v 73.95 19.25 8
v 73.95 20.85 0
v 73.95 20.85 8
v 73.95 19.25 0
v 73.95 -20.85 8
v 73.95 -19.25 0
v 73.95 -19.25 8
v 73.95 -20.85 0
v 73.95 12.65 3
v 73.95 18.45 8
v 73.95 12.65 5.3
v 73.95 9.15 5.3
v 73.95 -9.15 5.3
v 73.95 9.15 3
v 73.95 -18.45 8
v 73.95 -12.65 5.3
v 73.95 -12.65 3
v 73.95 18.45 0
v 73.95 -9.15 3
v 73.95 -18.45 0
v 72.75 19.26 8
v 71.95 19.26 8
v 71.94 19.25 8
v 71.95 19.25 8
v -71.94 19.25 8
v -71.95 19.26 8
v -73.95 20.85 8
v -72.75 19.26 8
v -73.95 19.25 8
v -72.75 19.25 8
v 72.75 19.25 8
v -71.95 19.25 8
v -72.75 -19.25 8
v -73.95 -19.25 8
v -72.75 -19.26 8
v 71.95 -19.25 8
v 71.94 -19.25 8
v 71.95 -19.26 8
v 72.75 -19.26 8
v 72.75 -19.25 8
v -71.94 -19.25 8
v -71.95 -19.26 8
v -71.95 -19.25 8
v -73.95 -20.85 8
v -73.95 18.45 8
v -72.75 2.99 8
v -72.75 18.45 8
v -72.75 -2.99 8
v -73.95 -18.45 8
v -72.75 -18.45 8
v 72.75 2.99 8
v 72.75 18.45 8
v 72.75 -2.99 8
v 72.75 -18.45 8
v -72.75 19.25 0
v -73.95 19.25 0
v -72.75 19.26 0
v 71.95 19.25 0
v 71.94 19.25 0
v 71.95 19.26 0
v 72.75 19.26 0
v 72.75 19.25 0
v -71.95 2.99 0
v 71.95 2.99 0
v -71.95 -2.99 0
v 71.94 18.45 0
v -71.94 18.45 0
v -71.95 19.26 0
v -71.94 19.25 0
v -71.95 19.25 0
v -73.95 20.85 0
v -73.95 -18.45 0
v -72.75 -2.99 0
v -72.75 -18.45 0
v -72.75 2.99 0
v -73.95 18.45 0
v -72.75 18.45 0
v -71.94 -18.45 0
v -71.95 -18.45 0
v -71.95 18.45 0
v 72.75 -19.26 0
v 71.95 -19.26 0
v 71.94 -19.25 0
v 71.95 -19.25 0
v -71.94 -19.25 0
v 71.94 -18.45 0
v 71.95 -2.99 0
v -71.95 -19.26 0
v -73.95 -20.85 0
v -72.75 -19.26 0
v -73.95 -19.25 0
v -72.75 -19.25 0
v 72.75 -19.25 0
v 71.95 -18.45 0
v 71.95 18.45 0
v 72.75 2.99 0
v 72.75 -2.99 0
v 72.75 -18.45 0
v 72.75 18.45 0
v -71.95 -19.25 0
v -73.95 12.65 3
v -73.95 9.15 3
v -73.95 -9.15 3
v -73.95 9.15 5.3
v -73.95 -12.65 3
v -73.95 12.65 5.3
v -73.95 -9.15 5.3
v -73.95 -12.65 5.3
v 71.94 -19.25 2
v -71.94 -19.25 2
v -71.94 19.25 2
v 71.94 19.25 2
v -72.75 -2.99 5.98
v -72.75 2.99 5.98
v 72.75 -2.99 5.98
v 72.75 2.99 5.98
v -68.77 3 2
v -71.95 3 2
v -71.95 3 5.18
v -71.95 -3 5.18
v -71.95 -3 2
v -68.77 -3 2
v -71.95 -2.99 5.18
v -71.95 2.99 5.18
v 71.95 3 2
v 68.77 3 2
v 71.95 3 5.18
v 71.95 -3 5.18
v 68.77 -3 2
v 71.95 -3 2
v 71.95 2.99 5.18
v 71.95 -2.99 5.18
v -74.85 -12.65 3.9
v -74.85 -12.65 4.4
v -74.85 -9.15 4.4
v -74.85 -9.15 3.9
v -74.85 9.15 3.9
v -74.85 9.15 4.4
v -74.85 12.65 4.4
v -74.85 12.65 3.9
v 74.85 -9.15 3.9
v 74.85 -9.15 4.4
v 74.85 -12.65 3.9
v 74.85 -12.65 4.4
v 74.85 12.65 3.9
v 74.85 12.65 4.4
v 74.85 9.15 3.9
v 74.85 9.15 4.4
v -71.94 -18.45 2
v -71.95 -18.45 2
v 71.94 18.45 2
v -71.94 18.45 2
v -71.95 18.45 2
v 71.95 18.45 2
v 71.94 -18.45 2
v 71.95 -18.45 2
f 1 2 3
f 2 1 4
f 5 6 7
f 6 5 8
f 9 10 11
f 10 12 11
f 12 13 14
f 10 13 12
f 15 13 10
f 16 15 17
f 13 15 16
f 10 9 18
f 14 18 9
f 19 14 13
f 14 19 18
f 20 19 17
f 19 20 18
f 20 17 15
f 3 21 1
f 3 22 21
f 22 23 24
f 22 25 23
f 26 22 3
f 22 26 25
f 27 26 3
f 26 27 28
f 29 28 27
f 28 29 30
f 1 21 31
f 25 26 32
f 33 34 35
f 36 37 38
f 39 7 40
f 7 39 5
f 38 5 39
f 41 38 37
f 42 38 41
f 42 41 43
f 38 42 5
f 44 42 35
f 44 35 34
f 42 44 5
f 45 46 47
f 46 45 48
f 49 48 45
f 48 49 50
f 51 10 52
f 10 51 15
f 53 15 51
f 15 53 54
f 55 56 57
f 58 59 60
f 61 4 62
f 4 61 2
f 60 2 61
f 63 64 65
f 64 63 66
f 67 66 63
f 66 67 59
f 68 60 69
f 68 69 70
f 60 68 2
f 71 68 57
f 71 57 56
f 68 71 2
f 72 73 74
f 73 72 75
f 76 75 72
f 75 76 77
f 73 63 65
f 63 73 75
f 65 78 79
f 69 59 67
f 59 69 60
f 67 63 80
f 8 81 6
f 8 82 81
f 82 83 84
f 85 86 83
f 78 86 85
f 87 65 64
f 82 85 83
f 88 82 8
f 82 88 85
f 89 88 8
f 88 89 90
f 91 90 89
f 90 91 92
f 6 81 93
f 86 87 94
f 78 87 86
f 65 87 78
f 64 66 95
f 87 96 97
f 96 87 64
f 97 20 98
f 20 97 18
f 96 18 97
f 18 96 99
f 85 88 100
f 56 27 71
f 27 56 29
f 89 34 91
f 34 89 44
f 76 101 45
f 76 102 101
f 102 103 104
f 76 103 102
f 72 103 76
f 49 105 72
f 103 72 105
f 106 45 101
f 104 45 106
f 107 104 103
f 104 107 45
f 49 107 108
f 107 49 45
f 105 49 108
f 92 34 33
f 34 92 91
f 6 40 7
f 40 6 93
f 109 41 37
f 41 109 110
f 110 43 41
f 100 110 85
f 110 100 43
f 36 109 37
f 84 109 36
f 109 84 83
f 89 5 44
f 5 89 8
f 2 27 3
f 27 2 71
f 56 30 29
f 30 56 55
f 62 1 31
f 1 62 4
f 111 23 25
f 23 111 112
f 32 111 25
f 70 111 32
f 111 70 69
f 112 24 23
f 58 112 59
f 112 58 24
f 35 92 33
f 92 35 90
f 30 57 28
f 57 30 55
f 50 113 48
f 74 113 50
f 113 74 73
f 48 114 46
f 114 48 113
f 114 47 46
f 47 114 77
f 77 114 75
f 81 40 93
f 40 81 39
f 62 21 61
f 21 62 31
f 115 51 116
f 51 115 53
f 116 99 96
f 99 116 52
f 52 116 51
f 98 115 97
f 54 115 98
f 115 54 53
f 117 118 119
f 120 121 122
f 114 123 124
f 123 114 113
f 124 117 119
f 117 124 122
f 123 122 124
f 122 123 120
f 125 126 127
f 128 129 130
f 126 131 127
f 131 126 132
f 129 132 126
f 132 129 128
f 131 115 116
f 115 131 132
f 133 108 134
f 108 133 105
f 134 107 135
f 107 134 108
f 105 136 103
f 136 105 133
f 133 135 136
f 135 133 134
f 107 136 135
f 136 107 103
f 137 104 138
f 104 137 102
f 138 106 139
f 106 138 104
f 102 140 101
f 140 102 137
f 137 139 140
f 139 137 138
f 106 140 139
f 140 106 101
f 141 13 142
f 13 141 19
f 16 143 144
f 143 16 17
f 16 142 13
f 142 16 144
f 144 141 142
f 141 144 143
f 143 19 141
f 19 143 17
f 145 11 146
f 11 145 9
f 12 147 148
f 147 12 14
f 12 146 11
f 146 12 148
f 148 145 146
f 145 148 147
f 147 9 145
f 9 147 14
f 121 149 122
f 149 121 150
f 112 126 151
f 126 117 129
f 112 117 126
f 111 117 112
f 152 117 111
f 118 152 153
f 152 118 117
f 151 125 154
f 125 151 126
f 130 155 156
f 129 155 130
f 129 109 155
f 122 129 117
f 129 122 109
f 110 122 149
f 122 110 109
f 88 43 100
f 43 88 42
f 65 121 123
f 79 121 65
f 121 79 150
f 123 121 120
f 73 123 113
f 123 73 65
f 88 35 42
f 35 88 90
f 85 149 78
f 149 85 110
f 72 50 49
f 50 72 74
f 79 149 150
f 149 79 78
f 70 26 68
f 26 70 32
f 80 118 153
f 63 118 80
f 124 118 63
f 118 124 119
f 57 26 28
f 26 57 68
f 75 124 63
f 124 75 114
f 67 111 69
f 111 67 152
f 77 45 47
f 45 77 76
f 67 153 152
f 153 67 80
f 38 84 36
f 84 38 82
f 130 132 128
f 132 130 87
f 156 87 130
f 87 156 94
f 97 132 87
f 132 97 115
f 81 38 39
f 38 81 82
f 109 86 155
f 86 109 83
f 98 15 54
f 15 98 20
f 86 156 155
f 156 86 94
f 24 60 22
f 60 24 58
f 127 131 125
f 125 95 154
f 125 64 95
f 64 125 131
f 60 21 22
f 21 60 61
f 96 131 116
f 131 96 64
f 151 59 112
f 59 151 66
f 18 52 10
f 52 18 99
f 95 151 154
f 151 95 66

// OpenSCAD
// bay_blank.scad
// Solid blank for one 5.25" bay of glowbox's NORCO RPC-470, replacing the
// stock black grille. It blocks air so the front intake goes through the two
// side drive bays instead. Same outline and tab positions as the grille.
//
// Clips: the stock grille's tabs hook deep and need a lot of flex to remove,
// which PETG won't take. Here each tab sits on its own short arm (the end
// wall, slit free from the face and rims except at a root in the middle of
// the end), sticks out less, and has a 45 deg catch so a firm pull releases
// it.
//
// PROTOTYPE: outline and tab positions are measured (photos
// P_20261028_0152*, _0159*, _0200*); the depths are GUESSED. Print one and
// test the snap before printing three.
//
// Axes: X = across the bay (width), Y = up (height), Z = depth; Z=0 is the
// front face, +Z runs into the case. Prints face down as modelled; the arms
// are walls standing on the bed, so they flex in the print plane.
//
// Render:  openscad -o bay_blank.stl bay_blank.scad

$fn = 32;

/* ---------- Measured (stock grille, 2026-10-28) ---------- */
blank_w  = 147.9;   // body width
blank_h  = 41.7;    // body height
stock_tab_w = 4.5;  // along the height
tab_gap  = 17.3;    // between the two tabs on one end
// Stock tabs stand 1.6 proud ((151.1 - 147.9) / 2).
// Whole 3-bay opening: 147.8 x 128.9, so the bays are on a ~43 mm pitch.

/* ---------- GUESSED: measure on the stock grille ---------- */
face_t   = 2.0;     // solid front face
rim_d    = 8;       // total depth, face to the back of the rim
tab_z0   = 3;       // tab starts this far behind the front face

/* ---------- Design choices ---------- */
tab_out  = 0.9;     // shallower than stock (1.6), for PETG
tab_w    = 3.5;     // Y; stock is 4.5, which was too tall for the case holes
tab_flat = 0.5;     // Z flat between the ramps (was 1)
rim_t    = 1.6;     // top/bottom rims
arm_t    = 1.2;     // end-wall arms, thin so they flex
root_l   = 6;       // where each end's arms join the body (middle of the end)
slit     = 0.8;
root_g   = 4;       // 45 deg gusset inside each root, end wall to face

/* ---------- Derived ---------- */
// tab centres, kept on the stock tabs' centres
tab_y = [-(tab_gap + stock_tab_w) / 2, (tab_gap + stock_tab_w) / 2];
tab_l = tab_out * 2 + tab_flat;   // along Z: 45 deg in, short flat, 45 deg out
arm_len = blank_h / 2 - rim_t - slit - root_l / 2;   // root to free tip
// Root strain at full deflection, for a cantilever loaded at the tab.
tab_arm = abs(tab_y[1]) - root_l / 2;
echo(arm_len = arm_len, tab_arm = tab_arm,
     strain_pct = 100 * 1.5 * arm_t * tab_out / (tab_arm * tab_arm));

// One tab on the +X end, pointing +X: 45 deg on both sides, so it cams
// in when pushed home and back out when pulled.
module tab() {
    // (u, v) = (X out from the end, Z)
    rotate([90, 0, 0]) linear_extrude(tab_w, center = true)
        polygon([[0, tab_z0], [tab_out, tab_z0 + tab_out],
                 [tab_out, tab_z0 + tab_out + tab_flat], [0, tab_z0 + tab_l]]);
}

// Gusset in the inside corner where the +X end wall's root meets the face.
// It stays within root_l, so the arms' free length (and flex) is unchanged.
module root_gusset() {
    // (u, v) = (X, Z)
    translate([blank_w / 2 - arm_t + 0.01, 0, face_t - 0.01])
        rotate([90, 0, 0]) linear_extrude(root_l, center = true)
            polygon([[0, 0], [-root_g, 0], [0, root_g]]);
}

module bay_blank() {
    difference() {
        union() {
            // face
            translate([-blank_w / 2, -blank_h / 2, 0]) cube([blank_w, blank_h, face_t]);
            // top/bottom rims
            for (sy = [-1, 1])
                translate([-blank_w / 2, sy > 0 ? blank_h / 2 - rim_t : -blank_h / 2, 0])
                    cube([blank_w, rim_t, rim_d]);
            // end walls (become the arms)
            for (sx = [-1, 1])
                translate([sx > 0 ? blank_w / 2 - arm_t : -blank_w / 2, -blank_h / 2, 0])
                    cube([arm_t, blank_h, rim_d]);
            // root gussets
            for (sx = [-1, 1]) mirror([sx < 0 ? 1 : 0, 0, 0]) root_gusset();
            // tabs
            for (sx = [-1, 1], y = tab_y)
                translate([sx * blank_w / 2, y, 0]) mirror([sx < 0 ? 1 : 0, 0, 0]) tab();
        }
        for (sx = [-1, 1], sy = [-1, 1]) {
            // slit along the inside of each arm, through the face, from the
            // root out to the tip
            translate([sx * (blank_w / 2 - arm_t - slit / 2), sy * (root_l / 2 + (arm_len + slit) / 2), rim_d / 2])
                cube([slit, arm_len + slit + 0.02, rim_d + 2], center = true);
            // slit across the arm tip, freeing it from the rim corner
            translate([sx * (blank_w / 2 - (arm_t + slit) / 2), sy * (blank_h / 2 - rim_t - slit / 2), rim_d / 2])
                cube([arm_t + slit + 0.02, slit, rim_d + 2], center = true);
        }
    }
}

bay_blank();
